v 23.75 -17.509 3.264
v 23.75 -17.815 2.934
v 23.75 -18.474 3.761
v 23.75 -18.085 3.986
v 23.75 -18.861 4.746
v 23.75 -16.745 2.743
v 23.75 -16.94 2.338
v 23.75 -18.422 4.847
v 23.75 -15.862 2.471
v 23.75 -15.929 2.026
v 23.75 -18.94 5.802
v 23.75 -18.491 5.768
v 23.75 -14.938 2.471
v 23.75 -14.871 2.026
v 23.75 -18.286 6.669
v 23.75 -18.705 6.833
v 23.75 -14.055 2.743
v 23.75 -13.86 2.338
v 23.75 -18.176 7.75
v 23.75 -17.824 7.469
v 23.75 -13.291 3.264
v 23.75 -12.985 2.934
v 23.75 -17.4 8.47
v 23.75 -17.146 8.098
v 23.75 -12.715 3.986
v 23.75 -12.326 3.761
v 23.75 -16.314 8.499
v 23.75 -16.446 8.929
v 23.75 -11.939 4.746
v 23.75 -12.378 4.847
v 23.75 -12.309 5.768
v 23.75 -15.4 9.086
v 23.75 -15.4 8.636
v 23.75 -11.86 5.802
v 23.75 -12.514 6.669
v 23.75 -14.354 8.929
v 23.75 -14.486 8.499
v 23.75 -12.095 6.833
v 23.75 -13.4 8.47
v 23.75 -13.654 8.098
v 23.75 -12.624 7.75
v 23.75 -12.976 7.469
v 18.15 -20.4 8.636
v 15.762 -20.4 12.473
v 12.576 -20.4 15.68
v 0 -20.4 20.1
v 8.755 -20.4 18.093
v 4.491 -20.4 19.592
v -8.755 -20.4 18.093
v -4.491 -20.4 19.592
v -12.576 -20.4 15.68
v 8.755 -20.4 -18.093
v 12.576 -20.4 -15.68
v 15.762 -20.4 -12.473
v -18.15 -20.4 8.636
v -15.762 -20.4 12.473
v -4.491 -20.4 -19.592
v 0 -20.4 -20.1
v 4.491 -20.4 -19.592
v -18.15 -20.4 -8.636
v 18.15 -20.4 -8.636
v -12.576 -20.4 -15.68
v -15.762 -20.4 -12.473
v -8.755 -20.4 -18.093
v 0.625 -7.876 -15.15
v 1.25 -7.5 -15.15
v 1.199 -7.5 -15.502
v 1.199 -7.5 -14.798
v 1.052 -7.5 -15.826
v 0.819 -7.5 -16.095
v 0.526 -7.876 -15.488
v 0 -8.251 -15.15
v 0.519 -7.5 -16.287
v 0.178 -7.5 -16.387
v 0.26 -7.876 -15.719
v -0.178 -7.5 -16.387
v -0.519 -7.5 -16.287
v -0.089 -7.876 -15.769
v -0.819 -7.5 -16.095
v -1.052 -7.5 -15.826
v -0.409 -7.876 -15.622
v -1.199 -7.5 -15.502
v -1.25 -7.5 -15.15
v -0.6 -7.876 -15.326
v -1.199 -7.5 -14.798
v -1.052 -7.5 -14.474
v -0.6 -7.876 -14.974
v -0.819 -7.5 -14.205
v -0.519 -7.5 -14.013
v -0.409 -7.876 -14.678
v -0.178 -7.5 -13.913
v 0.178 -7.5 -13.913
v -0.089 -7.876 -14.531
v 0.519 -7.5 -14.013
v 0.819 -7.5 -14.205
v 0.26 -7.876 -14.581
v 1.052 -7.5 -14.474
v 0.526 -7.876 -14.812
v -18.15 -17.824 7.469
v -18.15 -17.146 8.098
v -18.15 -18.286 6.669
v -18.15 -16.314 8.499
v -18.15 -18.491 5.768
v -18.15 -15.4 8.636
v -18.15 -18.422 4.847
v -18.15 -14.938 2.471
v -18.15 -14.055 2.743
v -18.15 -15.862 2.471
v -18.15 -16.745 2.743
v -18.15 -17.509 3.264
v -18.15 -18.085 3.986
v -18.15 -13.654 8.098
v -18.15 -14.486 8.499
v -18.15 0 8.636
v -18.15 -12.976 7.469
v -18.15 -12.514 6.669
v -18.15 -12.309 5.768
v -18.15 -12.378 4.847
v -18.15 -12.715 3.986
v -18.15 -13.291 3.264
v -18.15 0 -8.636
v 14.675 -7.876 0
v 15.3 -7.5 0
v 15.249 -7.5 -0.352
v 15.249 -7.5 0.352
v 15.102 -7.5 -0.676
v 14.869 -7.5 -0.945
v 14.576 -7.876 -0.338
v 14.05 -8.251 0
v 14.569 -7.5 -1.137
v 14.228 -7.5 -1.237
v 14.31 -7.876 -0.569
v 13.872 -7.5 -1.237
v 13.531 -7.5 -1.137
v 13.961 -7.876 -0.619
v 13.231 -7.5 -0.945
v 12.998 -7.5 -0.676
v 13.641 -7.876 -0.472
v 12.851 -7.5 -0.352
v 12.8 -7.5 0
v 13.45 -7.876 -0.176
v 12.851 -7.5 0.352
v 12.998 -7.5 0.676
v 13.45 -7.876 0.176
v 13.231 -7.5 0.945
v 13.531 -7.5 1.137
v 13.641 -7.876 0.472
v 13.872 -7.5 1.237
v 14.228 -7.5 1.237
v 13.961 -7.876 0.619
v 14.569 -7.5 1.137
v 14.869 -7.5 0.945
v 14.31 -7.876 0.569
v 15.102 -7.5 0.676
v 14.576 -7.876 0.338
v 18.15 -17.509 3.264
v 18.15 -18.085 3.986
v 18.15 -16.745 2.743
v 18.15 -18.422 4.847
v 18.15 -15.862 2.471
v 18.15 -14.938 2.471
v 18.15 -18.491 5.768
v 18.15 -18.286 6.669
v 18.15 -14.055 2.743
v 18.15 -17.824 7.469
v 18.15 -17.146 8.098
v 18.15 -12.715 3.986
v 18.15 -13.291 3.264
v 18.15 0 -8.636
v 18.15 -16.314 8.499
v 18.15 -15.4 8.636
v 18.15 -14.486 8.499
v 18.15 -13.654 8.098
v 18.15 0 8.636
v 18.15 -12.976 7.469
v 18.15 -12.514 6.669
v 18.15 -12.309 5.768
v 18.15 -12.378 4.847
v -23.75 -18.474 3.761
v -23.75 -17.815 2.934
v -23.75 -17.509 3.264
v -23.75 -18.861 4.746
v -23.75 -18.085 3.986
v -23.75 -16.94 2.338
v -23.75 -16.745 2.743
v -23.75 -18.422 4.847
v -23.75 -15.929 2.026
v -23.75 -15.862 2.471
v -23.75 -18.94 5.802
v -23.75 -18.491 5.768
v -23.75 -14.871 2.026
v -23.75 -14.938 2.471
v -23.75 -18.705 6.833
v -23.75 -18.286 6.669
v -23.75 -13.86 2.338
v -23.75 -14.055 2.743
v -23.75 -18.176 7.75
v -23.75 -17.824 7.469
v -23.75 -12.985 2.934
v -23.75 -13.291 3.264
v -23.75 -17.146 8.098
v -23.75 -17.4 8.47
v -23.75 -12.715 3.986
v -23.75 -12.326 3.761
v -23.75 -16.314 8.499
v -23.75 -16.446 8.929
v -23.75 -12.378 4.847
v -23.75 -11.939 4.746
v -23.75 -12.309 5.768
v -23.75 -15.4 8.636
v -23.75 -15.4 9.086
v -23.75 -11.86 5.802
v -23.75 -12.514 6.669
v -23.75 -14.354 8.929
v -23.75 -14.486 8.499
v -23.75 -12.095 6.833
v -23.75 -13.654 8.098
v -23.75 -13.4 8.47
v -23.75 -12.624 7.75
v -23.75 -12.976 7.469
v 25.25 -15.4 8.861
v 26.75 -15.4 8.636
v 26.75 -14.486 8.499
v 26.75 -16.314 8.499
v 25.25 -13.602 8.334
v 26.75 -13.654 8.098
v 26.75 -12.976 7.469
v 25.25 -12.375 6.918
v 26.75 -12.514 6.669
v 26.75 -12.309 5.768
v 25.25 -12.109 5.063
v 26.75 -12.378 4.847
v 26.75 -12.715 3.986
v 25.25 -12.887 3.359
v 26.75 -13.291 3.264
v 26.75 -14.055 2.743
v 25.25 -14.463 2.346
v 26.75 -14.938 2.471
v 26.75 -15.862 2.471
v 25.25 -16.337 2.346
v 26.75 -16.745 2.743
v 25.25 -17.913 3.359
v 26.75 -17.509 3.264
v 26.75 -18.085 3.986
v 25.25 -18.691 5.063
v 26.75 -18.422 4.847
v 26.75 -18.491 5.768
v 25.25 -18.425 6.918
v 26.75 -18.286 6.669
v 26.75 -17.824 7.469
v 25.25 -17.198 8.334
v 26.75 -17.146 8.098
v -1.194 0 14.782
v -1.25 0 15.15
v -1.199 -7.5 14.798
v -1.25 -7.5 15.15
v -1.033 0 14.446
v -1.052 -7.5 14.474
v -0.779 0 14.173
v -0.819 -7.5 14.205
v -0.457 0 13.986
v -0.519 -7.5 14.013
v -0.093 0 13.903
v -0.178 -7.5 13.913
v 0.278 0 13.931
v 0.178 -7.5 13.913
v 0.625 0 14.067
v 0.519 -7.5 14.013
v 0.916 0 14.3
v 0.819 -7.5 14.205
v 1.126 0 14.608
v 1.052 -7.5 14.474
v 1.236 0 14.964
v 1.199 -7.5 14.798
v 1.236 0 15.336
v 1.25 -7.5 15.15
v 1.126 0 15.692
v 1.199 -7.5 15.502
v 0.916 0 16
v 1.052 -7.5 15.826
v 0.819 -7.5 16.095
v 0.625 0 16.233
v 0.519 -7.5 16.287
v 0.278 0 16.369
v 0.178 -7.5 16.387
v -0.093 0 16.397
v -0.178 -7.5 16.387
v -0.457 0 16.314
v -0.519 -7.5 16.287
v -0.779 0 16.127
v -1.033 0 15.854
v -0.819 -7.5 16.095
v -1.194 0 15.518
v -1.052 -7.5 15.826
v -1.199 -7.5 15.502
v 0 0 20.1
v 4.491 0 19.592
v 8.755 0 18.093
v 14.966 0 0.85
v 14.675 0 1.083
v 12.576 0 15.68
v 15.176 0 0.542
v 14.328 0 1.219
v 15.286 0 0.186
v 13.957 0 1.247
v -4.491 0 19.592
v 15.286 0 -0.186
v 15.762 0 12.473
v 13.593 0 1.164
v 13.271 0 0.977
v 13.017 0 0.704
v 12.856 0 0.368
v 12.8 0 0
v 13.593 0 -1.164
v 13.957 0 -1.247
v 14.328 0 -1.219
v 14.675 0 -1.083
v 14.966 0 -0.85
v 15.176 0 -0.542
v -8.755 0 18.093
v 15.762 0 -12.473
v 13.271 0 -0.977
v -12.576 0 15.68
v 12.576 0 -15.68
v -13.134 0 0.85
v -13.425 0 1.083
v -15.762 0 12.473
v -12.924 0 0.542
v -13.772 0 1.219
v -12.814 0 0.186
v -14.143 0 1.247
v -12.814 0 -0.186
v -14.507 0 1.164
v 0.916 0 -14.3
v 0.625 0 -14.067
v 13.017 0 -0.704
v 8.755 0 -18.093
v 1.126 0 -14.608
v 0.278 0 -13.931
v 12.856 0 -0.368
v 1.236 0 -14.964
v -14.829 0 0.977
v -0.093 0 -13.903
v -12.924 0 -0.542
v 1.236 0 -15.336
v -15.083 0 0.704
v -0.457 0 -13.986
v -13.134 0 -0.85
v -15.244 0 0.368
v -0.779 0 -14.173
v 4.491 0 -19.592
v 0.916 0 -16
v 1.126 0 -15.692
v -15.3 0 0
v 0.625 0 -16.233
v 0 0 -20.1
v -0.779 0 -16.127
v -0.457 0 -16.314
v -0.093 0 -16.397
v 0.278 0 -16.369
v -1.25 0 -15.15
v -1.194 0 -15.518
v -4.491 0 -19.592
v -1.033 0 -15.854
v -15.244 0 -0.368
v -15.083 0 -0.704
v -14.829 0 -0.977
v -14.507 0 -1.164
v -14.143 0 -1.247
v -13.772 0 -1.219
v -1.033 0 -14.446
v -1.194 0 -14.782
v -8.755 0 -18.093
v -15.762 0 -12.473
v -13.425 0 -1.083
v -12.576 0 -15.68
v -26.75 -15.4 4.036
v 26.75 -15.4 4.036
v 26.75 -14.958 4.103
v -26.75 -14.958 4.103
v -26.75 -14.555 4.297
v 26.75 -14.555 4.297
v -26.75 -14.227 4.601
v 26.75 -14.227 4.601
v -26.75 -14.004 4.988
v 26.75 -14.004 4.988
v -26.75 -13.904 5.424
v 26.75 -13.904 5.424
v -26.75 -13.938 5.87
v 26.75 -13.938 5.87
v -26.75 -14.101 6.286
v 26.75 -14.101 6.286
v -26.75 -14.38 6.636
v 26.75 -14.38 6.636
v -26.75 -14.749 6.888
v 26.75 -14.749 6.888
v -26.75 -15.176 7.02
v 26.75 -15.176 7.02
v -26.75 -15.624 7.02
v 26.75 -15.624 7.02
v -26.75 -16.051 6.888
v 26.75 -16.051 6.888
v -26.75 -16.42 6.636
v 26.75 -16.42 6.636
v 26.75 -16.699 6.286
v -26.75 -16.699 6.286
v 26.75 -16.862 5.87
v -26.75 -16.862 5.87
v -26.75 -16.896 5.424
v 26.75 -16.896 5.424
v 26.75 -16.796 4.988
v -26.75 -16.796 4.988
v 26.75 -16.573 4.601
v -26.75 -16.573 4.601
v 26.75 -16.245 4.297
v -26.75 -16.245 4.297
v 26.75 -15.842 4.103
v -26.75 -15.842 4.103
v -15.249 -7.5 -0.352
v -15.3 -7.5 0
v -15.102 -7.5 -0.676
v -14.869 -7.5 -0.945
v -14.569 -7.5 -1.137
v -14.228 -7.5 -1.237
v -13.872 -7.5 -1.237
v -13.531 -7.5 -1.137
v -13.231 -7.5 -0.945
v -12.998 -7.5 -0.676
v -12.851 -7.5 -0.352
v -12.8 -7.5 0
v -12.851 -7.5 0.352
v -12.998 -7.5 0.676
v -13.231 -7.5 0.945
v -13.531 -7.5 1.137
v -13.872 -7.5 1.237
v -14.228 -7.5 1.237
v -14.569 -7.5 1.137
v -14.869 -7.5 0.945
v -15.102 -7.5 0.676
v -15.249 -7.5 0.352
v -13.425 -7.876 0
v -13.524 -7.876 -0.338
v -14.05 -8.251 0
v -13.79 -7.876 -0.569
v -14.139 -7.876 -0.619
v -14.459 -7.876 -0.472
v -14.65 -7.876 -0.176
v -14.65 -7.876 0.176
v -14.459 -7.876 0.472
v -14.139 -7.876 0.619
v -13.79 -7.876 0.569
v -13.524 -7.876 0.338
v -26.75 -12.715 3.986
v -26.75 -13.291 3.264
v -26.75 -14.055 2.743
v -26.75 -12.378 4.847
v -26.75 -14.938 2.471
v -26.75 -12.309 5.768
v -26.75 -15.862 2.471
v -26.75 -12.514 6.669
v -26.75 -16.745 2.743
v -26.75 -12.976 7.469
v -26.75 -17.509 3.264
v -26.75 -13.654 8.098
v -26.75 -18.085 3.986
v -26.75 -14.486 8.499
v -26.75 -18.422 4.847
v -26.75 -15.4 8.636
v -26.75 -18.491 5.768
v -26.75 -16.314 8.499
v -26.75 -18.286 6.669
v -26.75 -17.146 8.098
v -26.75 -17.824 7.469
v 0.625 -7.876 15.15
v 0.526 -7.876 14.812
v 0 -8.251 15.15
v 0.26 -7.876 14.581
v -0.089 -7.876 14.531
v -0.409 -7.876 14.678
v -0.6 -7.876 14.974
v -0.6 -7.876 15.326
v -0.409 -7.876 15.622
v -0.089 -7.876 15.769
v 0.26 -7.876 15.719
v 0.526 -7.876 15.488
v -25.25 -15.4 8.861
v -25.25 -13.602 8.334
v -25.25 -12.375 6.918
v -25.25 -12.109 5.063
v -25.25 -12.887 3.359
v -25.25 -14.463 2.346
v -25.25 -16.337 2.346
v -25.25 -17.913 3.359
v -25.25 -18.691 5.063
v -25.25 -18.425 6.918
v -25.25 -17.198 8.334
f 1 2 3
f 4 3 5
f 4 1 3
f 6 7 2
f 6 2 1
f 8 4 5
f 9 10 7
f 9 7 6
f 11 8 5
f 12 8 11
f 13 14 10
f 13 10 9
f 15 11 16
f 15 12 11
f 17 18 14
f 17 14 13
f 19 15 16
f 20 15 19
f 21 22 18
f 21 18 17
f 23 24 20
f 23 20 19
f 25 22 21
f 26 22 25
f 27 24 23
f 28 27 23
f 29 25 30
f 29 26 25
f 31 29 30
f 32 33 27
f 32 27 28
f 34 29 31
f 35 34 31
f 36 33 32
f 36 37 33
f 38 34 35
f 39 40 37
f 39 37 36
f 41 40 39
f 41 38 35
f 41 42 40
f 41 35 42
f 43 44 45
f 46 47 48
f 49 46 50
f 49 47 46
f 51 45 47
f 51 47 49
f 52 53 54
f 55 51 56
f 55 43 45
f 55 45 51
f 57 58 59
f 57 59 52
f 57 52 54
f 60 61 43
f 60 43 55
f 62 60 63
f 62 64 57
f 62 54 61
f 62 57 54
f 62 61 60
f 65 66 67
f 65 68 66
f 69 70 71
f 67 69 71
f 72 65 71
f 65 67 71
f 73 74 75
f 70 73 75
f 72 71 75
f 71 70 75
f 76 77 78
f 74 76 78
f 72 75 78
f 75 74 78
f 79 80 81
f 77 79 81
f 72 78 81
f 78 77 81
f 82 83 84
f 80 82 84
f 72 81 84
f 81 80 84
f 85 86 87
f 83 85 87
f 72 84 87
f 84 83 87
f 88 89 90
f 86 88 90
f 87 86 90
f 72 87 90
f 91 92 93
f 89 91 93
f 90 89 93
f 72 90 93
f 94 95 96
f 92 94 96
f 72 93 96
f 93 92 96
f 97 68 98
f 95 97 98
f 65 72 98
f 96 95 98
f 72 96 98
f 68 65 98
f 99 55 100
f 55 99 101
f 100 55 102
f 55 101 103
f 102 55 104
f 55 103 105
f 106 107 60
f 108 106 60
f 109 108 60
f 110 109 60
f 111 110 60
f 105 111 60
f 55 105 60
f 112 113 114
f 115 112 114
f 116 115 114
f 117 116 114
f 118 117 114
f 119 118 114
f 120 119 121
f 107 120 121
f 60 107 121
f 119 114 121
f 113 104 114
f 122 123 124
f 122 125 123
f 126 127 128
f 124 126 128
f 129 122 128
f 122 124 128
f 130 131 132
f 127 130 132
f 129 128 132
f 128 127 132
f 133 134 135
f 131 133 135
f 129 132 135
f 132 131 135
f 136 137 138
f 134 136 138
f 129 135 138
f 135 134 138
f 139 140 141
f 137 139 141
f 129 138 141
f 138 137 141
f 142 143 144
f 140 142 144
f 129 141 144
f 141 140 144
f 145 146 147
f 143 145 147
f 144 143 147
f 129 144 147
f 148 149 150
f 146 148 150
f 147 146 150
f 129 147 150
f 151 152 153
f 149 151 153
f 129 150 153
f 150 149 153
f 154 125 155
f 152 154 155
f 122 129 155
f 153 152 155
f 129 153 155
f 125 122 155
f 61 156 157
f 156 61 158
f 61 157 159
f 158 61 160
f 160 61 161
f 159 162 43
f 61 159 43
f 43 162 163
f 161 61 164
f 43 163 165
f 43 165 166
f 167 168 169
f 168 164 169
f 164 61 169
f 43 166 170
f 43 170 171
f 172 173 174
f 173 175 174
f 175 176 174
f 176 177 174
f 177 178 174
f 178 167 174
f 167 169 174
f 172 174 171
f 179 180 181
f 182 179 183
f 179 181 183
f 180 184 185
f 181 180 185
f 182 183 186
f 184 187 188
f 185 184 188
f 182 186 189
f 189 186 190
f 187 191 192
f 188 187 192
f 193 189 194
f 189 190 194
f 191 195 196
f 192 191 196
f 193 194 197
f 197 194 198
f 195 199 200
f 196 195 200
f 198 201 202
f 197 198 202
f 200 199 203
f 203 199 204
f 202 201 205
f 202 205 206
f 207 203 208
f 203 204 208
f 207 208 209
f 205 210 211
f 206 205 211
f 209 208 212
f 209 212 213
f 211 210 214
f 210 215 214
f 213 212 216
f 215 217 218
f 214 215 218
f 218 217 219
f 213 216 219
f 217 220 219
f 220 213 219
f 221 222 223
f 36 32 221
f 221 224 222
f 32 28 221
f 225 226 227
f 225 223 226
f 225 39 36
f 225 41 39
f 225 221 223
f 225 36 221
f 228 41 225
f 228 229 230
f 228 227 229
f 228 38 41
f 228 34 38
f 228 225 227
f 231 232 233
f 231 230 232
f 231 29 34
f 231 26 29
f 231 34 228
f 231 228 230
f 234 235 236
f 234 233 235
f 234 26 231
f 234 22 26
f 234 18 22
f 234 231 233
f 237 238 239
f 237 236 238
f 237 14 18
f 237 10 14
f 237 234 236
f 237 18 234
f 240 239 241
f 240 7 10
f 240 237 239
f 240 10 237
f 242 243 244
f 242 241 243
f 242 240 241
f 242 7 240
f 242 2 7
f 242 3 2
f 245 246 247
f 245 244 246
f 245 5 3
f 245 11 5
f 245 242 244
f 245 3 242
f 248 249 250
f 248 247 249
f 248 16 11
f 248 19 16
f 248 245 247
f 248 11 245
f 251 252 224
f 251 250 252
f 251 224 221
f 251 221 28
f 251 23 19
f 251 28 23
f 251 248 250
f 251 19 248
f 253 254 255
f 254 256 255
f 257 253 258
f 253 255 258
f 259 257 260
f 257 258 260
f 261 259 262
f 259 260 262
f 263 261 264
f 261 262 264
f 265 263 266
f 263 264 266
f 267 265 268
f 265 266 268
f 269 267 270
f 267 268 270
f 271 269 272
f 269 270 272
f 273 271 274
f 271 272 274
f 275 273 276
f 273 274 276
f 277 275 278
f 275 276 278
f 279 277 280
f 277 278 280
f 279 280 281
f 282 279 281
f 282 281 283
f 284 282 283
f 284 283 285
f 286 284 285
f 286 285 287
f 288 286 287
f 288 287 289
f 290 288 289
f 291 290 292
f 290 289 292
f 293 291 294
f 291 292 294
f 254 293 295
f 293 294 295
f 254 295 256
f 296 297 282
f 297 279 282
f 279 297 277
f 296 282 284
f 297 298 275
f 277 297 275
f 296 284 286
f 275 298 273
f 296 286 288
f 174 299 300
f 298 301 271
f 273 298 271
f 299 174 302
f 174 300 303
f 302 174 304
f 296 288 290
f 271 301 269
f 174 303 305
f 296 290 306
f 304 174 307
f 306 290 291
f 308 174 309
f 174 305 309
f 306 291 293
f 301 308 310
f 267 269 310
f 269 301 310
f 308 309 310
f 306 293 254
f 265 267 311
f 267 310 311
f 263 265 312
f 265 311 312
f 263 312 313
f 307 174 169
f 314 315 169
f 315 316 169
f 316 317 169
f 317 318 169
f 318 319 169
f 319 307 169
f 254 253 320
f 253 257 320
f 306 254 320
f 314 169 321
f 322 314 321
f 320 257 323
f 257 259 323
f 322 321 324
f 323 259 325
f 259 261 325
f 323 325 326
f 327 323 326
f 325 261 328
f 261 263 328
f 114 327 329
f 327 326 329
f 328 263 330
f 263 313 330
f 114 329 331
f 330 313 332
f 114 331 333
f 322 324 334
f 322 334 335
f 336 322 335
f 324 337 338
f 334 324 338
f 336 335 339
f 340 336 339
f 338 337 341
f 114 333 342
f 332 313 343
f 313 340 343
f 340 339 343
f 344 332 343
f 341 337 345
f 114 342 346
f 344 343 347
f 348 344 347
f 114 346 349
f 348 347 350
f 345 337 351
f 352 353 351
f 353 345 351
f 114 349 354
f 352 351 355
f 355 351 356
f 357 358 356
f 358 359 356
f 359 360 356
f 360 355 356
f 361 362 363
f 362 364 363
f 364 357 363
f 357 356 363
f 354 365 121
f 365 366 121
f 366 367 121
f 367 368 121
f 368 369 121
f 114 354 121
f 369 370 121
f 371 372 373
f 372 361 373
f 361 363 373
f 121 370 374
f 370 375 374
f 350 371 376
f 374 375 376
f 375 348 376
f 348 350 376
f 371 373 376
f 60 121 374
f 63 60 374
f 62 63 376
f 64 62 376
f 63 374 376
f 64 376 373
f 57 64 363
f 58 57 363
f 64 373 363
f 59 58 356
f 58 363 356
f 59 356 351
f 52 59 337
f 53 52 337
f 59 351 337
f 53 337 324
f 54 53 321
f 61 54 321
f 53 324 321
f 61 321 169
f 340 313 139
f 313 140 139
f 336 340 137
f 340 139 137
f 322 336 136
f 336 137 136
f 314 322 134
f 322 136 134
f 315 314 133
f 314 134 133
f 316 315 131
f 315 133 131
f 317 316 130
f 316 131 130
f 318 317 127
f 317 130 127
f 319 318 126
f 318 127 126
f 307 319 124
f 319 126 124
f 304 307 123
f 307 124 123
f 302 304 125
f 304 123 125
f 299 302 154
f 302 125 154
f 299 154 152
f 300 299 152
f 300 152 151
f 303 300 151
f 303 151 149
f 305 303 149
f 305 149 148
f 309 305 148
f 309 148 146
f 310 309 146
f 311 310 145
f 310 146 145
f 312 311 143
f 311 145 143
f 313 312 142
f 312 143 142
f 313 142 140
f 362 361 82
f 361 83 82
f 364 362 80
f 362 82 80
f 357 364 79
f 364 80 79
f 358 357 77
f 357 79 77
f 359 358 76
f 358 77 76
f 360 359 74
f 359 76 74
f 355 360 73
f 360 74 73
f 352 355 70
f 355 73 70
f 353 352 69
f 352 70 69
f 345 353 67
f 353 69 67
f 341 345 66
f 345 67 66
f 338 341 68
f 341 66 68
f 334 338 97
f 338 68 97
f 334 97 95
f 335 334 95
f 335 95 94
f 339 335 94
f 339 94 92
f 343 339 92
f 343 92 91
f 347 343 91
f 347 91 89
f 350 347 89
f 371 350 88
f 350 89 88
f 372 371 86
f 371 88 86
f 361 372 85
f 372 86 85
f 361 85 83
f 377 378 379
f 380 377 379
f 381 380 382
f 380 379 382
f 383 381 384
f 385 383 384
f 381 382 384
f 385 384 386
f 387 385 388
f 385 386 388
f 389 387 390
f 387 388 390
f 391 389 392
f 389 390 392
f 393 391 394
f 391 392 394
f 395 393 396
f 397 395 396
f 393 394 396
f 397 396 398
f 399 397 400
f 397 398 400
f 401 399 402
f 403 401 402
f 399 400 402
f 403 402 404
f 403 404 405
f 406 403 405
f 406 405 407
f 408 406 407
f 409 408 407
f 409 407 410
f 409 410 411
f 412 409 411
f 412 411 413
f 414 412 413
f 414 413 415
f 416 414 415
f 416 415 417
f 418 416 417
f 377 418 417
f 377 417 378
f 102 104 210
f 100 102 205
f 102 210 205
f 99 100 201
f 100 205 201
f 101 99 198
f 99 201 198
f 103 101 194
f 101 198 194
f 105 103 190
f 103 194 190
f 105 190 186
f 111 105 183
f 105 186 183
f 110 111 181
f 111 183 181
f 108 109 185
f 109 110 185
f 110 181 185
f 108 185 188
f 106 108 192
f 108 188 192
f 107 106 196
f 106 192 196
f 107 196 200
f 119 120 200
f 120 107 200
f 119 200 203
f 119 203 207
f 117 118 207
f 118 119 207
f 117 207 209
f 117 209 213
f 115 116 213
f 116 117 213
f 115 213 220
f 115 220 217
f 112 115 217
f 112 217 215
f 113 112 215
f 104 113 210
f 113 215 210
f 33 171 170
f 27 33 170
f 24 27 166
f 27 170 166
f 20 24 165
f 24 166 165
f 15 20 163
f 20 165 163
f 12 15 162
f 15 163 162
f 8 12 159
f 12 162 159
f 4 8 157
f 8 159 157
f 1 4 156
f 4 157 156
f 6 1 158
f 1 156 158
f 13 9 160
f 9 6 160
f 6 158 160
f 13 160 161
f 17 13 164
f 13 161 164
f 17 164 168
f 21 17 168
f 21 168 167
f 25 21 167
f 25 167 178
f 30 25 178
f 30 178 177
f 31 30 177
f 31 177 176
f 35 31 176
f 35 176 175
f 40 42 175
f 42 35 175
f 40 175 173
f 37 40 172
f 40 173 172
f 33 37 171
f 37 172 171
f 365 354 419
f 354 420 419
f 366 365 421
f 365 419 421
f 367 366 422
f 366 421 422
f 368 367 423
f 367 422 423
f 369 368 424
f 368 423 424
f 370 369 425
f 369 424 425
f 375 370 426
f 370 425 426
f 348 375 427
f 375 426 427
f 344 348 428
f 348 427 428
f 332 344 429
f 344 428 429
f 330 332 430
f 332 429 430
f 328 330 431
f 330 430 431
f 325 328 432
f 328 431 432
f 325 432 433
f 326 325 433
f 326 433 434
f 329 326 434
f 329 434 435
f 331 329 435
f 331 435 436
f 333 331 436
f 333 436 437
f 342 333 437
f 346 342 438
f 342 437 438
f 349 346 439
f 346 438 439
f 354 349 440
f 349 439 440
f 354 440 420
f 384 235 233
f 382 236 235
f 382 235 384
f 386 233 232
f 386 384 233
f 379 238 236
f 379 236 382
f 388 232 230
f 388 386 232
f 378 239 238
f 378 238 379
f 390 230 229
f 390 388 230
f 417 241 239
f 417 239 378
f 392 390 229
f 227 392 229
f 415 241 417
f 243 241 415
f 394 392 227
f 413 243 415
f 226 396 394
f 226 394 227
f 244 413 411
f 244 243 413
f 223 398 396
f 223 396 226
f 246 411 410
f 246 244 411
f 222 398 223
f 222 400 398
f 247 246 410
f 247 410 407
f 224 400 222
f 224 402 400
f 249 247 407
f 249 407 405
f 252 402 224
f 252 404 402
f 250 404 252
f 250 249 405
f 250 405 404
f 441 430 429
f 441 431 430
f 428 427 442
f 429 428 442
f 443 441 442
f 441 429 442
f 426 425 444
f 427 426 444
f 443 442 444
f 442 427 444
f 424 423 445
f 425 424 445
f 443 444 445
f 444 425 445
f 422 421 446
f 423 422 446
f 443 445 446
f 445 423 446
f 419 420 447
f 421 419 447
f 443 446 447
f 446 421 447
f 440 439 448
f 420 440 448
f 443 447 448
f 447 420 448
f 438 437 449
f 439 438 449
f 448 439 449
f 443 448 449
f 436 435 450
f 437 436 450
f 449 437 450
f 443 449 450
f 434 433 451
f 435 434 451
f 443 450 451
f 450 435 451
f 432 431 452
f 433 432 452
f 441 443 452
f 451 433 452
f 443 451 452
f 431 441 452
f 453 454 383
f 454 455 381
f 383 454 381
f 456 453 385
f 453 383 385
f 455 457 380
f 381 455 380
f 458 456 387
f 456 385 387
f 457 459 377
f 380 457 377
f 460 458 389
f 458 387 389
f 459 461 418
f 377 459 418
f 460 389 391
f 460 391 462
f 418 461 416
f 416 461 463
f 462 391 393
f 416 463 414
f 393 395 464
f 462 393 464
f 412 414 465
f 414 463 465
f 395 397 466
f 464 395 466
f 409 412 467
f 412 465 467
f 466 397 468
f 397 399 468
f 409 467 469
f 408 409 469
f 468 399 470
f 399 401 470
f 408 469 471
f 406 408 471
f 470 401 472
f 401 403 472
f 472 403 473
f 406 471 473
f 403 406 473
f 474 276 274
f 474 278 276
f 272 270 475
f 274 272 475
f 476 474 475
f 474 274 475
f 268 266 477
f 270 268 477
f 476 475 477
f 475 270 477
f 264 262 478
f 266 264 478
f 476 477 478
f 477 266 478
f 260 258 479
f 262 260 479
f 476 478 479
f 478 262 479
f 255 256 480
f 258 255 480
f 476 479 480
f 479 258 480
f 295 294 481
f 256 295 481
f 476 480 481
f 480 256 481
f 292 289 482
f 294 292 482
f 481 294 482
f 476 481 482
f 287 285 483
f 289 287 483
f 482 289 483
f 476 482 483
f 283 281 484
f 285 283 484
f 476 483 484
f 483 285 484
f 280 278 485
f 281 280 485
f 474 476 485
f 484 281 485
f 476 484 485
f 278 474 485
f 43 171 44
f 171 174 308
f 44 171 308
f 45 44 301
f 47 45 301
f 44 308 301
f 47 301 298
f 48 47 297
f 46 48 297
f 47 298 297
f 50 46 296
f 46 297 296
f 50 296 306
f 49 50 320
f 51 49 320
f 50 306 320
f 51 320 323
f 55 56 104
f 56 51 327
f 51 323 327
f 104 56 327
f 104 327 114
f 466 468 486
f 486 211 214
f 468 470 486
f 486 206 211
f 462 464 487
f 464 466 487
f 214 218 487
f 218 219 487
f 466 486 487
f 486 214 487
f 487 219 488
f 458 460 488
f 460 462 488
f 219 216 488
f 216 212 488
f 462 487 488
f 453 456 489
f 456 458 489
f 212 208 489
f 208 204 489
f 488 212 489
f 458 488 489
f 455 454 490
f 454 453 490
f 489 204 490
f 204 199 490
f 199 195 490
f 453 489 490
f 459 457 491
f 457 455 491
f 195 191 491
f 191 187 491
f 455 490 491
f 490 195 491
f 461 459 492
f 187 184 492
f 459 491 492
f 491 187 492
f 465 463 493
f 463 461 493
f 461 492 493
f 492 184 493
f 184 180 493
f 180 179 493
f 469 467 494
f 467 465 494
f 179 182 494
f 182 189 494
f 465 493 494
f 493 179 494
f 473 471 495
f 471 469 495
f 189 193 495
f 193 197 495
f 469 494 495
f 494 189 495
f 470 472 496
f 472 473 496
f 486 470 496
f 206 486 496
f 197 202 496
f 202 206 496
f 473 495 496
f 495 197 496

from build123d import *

# Parameters (mm, degrees)
BOSS_EXTRUDE1_DEPTH       = 20.4
M3X0_5_TAPPED_HOLE1_D     = 2.5
M3X0_5_TAPPED_HOLE1_DEPTH = 7.5
M3X0_5_TAPPED_HOLE1_TIP   = 0.751075774
BOSS_EXTRUDE3_DEPTH       = 8.6
BOSS_EXTRUDE3_DEPTH_BACK  = 44.9
SKETCH5_R                 = 3.1
SKETCH8_R                 = 1.5
CUT_EXTRUDE1_DEPTH        = 61.682946534


with BuildPart() as part:
    # Sketch1 → Boss-Extrude1 (new body)
    with BuildSketch(Plane(origin=(0, 0, 0), x_dir=(1, 0, 0), z_dir=(0, 1, 0))):
        with BuildLine():
            Line((-18.15, -8.636405502), (-18.15, 8.636405502))
            ThreePointArc((-18.15, 8.636405502), (0, 20.1), (18.15, 8.636405502))
            Line((18.15, 8.636405502), (18.15, -8.636405502))
            ThreePointArc((18.15, -8.636405502), (0, -20.1), (-18.15, -8.636405502))
        make_face()
    extrude(amount=-BOSS_EXTRUDE1_DEPTH)

    # M3x0.5 Tapped Hole1
    with Locations(Plane(origin=(0, 0, 0), x_dir=(1, 0, 0), z_dir=(0, 1, 0))):
        with Locations((0, 15.15), (0, -15.15), (14.05, 0), (-14.05, 0)):
            Hole(M3X0_5_TAPPED_HOLE1_D / 2, depth=M3X0_5_TAPPED_HOLE1_DEPTH)
            with Locations((0, 0, -(M3X0_5_TAPPED_HOLE1_DEPTH + M3X0_5_TAPPED_HOLE1_TIP / 2))):  # 118° drill point
                Cone(0, M3X0_5_TAPPED_HOLE1_D / 2, M3X0_5_TAPPED_HOLE1_TIP, mode=Mode.SUBTRACT)

    # Sketch5 → Boss-Extrude3 (add, two sides: drawn at the far end of the back side and taken through both)
    with BuildSketch(Plane(origin=(18.15, 0, 0), x_dir=(0, 0, -1), z_dir=(1, 0, 0)).offset(-BOSS_EXTRUDE3_DEPTH_BACK)):
        with Locations(Location((-5.536405502, -15.4, 0), (0, 0, 180))):
            Circle(SKETCH5_R)
    extrude(amount=BOSS_EXTRUDE3_DEPTH + BOSS_EXTRUDE3_DEPTH_BACK)

    # Sketch7 → Revolve1 (revolve)
    with BuildSketch(Plane.XY.offset(5.536405502), mode=Mode.PRIVATE) as revolve1_sk:
        Polygon((26.75, -12.3), (23.75, -11.85), (23.75, -12.3), align=None)
        Polygon((-26.75, -12.3), (-23.75, -11.85), (-23.75, -12.3), align=None)
    revolve(revolve1_sk.sketch.rotate(Axis((26.75, -15.4, 5.536405502), (-1, 0, 0)), 270), axis=Axis((26.75, -15.4, 5.536405502), (-1, 0, 0)))

    # Sketch8 → Cut-Extrude1 (cut, through all)
    with BuildSketch(Plane(origin=(26.75, 0, 0), x_dir=(0, 0, -1), z_dir=(1, 0, 0))):
        with Locations((-5.536405502, -15.4)):
            Circle(SKETCH8_R)
    extrude(amount=-CUT_EXTRUDE1_DEPTH, mode=Mode.SUBTRACT)


solid = part.part
